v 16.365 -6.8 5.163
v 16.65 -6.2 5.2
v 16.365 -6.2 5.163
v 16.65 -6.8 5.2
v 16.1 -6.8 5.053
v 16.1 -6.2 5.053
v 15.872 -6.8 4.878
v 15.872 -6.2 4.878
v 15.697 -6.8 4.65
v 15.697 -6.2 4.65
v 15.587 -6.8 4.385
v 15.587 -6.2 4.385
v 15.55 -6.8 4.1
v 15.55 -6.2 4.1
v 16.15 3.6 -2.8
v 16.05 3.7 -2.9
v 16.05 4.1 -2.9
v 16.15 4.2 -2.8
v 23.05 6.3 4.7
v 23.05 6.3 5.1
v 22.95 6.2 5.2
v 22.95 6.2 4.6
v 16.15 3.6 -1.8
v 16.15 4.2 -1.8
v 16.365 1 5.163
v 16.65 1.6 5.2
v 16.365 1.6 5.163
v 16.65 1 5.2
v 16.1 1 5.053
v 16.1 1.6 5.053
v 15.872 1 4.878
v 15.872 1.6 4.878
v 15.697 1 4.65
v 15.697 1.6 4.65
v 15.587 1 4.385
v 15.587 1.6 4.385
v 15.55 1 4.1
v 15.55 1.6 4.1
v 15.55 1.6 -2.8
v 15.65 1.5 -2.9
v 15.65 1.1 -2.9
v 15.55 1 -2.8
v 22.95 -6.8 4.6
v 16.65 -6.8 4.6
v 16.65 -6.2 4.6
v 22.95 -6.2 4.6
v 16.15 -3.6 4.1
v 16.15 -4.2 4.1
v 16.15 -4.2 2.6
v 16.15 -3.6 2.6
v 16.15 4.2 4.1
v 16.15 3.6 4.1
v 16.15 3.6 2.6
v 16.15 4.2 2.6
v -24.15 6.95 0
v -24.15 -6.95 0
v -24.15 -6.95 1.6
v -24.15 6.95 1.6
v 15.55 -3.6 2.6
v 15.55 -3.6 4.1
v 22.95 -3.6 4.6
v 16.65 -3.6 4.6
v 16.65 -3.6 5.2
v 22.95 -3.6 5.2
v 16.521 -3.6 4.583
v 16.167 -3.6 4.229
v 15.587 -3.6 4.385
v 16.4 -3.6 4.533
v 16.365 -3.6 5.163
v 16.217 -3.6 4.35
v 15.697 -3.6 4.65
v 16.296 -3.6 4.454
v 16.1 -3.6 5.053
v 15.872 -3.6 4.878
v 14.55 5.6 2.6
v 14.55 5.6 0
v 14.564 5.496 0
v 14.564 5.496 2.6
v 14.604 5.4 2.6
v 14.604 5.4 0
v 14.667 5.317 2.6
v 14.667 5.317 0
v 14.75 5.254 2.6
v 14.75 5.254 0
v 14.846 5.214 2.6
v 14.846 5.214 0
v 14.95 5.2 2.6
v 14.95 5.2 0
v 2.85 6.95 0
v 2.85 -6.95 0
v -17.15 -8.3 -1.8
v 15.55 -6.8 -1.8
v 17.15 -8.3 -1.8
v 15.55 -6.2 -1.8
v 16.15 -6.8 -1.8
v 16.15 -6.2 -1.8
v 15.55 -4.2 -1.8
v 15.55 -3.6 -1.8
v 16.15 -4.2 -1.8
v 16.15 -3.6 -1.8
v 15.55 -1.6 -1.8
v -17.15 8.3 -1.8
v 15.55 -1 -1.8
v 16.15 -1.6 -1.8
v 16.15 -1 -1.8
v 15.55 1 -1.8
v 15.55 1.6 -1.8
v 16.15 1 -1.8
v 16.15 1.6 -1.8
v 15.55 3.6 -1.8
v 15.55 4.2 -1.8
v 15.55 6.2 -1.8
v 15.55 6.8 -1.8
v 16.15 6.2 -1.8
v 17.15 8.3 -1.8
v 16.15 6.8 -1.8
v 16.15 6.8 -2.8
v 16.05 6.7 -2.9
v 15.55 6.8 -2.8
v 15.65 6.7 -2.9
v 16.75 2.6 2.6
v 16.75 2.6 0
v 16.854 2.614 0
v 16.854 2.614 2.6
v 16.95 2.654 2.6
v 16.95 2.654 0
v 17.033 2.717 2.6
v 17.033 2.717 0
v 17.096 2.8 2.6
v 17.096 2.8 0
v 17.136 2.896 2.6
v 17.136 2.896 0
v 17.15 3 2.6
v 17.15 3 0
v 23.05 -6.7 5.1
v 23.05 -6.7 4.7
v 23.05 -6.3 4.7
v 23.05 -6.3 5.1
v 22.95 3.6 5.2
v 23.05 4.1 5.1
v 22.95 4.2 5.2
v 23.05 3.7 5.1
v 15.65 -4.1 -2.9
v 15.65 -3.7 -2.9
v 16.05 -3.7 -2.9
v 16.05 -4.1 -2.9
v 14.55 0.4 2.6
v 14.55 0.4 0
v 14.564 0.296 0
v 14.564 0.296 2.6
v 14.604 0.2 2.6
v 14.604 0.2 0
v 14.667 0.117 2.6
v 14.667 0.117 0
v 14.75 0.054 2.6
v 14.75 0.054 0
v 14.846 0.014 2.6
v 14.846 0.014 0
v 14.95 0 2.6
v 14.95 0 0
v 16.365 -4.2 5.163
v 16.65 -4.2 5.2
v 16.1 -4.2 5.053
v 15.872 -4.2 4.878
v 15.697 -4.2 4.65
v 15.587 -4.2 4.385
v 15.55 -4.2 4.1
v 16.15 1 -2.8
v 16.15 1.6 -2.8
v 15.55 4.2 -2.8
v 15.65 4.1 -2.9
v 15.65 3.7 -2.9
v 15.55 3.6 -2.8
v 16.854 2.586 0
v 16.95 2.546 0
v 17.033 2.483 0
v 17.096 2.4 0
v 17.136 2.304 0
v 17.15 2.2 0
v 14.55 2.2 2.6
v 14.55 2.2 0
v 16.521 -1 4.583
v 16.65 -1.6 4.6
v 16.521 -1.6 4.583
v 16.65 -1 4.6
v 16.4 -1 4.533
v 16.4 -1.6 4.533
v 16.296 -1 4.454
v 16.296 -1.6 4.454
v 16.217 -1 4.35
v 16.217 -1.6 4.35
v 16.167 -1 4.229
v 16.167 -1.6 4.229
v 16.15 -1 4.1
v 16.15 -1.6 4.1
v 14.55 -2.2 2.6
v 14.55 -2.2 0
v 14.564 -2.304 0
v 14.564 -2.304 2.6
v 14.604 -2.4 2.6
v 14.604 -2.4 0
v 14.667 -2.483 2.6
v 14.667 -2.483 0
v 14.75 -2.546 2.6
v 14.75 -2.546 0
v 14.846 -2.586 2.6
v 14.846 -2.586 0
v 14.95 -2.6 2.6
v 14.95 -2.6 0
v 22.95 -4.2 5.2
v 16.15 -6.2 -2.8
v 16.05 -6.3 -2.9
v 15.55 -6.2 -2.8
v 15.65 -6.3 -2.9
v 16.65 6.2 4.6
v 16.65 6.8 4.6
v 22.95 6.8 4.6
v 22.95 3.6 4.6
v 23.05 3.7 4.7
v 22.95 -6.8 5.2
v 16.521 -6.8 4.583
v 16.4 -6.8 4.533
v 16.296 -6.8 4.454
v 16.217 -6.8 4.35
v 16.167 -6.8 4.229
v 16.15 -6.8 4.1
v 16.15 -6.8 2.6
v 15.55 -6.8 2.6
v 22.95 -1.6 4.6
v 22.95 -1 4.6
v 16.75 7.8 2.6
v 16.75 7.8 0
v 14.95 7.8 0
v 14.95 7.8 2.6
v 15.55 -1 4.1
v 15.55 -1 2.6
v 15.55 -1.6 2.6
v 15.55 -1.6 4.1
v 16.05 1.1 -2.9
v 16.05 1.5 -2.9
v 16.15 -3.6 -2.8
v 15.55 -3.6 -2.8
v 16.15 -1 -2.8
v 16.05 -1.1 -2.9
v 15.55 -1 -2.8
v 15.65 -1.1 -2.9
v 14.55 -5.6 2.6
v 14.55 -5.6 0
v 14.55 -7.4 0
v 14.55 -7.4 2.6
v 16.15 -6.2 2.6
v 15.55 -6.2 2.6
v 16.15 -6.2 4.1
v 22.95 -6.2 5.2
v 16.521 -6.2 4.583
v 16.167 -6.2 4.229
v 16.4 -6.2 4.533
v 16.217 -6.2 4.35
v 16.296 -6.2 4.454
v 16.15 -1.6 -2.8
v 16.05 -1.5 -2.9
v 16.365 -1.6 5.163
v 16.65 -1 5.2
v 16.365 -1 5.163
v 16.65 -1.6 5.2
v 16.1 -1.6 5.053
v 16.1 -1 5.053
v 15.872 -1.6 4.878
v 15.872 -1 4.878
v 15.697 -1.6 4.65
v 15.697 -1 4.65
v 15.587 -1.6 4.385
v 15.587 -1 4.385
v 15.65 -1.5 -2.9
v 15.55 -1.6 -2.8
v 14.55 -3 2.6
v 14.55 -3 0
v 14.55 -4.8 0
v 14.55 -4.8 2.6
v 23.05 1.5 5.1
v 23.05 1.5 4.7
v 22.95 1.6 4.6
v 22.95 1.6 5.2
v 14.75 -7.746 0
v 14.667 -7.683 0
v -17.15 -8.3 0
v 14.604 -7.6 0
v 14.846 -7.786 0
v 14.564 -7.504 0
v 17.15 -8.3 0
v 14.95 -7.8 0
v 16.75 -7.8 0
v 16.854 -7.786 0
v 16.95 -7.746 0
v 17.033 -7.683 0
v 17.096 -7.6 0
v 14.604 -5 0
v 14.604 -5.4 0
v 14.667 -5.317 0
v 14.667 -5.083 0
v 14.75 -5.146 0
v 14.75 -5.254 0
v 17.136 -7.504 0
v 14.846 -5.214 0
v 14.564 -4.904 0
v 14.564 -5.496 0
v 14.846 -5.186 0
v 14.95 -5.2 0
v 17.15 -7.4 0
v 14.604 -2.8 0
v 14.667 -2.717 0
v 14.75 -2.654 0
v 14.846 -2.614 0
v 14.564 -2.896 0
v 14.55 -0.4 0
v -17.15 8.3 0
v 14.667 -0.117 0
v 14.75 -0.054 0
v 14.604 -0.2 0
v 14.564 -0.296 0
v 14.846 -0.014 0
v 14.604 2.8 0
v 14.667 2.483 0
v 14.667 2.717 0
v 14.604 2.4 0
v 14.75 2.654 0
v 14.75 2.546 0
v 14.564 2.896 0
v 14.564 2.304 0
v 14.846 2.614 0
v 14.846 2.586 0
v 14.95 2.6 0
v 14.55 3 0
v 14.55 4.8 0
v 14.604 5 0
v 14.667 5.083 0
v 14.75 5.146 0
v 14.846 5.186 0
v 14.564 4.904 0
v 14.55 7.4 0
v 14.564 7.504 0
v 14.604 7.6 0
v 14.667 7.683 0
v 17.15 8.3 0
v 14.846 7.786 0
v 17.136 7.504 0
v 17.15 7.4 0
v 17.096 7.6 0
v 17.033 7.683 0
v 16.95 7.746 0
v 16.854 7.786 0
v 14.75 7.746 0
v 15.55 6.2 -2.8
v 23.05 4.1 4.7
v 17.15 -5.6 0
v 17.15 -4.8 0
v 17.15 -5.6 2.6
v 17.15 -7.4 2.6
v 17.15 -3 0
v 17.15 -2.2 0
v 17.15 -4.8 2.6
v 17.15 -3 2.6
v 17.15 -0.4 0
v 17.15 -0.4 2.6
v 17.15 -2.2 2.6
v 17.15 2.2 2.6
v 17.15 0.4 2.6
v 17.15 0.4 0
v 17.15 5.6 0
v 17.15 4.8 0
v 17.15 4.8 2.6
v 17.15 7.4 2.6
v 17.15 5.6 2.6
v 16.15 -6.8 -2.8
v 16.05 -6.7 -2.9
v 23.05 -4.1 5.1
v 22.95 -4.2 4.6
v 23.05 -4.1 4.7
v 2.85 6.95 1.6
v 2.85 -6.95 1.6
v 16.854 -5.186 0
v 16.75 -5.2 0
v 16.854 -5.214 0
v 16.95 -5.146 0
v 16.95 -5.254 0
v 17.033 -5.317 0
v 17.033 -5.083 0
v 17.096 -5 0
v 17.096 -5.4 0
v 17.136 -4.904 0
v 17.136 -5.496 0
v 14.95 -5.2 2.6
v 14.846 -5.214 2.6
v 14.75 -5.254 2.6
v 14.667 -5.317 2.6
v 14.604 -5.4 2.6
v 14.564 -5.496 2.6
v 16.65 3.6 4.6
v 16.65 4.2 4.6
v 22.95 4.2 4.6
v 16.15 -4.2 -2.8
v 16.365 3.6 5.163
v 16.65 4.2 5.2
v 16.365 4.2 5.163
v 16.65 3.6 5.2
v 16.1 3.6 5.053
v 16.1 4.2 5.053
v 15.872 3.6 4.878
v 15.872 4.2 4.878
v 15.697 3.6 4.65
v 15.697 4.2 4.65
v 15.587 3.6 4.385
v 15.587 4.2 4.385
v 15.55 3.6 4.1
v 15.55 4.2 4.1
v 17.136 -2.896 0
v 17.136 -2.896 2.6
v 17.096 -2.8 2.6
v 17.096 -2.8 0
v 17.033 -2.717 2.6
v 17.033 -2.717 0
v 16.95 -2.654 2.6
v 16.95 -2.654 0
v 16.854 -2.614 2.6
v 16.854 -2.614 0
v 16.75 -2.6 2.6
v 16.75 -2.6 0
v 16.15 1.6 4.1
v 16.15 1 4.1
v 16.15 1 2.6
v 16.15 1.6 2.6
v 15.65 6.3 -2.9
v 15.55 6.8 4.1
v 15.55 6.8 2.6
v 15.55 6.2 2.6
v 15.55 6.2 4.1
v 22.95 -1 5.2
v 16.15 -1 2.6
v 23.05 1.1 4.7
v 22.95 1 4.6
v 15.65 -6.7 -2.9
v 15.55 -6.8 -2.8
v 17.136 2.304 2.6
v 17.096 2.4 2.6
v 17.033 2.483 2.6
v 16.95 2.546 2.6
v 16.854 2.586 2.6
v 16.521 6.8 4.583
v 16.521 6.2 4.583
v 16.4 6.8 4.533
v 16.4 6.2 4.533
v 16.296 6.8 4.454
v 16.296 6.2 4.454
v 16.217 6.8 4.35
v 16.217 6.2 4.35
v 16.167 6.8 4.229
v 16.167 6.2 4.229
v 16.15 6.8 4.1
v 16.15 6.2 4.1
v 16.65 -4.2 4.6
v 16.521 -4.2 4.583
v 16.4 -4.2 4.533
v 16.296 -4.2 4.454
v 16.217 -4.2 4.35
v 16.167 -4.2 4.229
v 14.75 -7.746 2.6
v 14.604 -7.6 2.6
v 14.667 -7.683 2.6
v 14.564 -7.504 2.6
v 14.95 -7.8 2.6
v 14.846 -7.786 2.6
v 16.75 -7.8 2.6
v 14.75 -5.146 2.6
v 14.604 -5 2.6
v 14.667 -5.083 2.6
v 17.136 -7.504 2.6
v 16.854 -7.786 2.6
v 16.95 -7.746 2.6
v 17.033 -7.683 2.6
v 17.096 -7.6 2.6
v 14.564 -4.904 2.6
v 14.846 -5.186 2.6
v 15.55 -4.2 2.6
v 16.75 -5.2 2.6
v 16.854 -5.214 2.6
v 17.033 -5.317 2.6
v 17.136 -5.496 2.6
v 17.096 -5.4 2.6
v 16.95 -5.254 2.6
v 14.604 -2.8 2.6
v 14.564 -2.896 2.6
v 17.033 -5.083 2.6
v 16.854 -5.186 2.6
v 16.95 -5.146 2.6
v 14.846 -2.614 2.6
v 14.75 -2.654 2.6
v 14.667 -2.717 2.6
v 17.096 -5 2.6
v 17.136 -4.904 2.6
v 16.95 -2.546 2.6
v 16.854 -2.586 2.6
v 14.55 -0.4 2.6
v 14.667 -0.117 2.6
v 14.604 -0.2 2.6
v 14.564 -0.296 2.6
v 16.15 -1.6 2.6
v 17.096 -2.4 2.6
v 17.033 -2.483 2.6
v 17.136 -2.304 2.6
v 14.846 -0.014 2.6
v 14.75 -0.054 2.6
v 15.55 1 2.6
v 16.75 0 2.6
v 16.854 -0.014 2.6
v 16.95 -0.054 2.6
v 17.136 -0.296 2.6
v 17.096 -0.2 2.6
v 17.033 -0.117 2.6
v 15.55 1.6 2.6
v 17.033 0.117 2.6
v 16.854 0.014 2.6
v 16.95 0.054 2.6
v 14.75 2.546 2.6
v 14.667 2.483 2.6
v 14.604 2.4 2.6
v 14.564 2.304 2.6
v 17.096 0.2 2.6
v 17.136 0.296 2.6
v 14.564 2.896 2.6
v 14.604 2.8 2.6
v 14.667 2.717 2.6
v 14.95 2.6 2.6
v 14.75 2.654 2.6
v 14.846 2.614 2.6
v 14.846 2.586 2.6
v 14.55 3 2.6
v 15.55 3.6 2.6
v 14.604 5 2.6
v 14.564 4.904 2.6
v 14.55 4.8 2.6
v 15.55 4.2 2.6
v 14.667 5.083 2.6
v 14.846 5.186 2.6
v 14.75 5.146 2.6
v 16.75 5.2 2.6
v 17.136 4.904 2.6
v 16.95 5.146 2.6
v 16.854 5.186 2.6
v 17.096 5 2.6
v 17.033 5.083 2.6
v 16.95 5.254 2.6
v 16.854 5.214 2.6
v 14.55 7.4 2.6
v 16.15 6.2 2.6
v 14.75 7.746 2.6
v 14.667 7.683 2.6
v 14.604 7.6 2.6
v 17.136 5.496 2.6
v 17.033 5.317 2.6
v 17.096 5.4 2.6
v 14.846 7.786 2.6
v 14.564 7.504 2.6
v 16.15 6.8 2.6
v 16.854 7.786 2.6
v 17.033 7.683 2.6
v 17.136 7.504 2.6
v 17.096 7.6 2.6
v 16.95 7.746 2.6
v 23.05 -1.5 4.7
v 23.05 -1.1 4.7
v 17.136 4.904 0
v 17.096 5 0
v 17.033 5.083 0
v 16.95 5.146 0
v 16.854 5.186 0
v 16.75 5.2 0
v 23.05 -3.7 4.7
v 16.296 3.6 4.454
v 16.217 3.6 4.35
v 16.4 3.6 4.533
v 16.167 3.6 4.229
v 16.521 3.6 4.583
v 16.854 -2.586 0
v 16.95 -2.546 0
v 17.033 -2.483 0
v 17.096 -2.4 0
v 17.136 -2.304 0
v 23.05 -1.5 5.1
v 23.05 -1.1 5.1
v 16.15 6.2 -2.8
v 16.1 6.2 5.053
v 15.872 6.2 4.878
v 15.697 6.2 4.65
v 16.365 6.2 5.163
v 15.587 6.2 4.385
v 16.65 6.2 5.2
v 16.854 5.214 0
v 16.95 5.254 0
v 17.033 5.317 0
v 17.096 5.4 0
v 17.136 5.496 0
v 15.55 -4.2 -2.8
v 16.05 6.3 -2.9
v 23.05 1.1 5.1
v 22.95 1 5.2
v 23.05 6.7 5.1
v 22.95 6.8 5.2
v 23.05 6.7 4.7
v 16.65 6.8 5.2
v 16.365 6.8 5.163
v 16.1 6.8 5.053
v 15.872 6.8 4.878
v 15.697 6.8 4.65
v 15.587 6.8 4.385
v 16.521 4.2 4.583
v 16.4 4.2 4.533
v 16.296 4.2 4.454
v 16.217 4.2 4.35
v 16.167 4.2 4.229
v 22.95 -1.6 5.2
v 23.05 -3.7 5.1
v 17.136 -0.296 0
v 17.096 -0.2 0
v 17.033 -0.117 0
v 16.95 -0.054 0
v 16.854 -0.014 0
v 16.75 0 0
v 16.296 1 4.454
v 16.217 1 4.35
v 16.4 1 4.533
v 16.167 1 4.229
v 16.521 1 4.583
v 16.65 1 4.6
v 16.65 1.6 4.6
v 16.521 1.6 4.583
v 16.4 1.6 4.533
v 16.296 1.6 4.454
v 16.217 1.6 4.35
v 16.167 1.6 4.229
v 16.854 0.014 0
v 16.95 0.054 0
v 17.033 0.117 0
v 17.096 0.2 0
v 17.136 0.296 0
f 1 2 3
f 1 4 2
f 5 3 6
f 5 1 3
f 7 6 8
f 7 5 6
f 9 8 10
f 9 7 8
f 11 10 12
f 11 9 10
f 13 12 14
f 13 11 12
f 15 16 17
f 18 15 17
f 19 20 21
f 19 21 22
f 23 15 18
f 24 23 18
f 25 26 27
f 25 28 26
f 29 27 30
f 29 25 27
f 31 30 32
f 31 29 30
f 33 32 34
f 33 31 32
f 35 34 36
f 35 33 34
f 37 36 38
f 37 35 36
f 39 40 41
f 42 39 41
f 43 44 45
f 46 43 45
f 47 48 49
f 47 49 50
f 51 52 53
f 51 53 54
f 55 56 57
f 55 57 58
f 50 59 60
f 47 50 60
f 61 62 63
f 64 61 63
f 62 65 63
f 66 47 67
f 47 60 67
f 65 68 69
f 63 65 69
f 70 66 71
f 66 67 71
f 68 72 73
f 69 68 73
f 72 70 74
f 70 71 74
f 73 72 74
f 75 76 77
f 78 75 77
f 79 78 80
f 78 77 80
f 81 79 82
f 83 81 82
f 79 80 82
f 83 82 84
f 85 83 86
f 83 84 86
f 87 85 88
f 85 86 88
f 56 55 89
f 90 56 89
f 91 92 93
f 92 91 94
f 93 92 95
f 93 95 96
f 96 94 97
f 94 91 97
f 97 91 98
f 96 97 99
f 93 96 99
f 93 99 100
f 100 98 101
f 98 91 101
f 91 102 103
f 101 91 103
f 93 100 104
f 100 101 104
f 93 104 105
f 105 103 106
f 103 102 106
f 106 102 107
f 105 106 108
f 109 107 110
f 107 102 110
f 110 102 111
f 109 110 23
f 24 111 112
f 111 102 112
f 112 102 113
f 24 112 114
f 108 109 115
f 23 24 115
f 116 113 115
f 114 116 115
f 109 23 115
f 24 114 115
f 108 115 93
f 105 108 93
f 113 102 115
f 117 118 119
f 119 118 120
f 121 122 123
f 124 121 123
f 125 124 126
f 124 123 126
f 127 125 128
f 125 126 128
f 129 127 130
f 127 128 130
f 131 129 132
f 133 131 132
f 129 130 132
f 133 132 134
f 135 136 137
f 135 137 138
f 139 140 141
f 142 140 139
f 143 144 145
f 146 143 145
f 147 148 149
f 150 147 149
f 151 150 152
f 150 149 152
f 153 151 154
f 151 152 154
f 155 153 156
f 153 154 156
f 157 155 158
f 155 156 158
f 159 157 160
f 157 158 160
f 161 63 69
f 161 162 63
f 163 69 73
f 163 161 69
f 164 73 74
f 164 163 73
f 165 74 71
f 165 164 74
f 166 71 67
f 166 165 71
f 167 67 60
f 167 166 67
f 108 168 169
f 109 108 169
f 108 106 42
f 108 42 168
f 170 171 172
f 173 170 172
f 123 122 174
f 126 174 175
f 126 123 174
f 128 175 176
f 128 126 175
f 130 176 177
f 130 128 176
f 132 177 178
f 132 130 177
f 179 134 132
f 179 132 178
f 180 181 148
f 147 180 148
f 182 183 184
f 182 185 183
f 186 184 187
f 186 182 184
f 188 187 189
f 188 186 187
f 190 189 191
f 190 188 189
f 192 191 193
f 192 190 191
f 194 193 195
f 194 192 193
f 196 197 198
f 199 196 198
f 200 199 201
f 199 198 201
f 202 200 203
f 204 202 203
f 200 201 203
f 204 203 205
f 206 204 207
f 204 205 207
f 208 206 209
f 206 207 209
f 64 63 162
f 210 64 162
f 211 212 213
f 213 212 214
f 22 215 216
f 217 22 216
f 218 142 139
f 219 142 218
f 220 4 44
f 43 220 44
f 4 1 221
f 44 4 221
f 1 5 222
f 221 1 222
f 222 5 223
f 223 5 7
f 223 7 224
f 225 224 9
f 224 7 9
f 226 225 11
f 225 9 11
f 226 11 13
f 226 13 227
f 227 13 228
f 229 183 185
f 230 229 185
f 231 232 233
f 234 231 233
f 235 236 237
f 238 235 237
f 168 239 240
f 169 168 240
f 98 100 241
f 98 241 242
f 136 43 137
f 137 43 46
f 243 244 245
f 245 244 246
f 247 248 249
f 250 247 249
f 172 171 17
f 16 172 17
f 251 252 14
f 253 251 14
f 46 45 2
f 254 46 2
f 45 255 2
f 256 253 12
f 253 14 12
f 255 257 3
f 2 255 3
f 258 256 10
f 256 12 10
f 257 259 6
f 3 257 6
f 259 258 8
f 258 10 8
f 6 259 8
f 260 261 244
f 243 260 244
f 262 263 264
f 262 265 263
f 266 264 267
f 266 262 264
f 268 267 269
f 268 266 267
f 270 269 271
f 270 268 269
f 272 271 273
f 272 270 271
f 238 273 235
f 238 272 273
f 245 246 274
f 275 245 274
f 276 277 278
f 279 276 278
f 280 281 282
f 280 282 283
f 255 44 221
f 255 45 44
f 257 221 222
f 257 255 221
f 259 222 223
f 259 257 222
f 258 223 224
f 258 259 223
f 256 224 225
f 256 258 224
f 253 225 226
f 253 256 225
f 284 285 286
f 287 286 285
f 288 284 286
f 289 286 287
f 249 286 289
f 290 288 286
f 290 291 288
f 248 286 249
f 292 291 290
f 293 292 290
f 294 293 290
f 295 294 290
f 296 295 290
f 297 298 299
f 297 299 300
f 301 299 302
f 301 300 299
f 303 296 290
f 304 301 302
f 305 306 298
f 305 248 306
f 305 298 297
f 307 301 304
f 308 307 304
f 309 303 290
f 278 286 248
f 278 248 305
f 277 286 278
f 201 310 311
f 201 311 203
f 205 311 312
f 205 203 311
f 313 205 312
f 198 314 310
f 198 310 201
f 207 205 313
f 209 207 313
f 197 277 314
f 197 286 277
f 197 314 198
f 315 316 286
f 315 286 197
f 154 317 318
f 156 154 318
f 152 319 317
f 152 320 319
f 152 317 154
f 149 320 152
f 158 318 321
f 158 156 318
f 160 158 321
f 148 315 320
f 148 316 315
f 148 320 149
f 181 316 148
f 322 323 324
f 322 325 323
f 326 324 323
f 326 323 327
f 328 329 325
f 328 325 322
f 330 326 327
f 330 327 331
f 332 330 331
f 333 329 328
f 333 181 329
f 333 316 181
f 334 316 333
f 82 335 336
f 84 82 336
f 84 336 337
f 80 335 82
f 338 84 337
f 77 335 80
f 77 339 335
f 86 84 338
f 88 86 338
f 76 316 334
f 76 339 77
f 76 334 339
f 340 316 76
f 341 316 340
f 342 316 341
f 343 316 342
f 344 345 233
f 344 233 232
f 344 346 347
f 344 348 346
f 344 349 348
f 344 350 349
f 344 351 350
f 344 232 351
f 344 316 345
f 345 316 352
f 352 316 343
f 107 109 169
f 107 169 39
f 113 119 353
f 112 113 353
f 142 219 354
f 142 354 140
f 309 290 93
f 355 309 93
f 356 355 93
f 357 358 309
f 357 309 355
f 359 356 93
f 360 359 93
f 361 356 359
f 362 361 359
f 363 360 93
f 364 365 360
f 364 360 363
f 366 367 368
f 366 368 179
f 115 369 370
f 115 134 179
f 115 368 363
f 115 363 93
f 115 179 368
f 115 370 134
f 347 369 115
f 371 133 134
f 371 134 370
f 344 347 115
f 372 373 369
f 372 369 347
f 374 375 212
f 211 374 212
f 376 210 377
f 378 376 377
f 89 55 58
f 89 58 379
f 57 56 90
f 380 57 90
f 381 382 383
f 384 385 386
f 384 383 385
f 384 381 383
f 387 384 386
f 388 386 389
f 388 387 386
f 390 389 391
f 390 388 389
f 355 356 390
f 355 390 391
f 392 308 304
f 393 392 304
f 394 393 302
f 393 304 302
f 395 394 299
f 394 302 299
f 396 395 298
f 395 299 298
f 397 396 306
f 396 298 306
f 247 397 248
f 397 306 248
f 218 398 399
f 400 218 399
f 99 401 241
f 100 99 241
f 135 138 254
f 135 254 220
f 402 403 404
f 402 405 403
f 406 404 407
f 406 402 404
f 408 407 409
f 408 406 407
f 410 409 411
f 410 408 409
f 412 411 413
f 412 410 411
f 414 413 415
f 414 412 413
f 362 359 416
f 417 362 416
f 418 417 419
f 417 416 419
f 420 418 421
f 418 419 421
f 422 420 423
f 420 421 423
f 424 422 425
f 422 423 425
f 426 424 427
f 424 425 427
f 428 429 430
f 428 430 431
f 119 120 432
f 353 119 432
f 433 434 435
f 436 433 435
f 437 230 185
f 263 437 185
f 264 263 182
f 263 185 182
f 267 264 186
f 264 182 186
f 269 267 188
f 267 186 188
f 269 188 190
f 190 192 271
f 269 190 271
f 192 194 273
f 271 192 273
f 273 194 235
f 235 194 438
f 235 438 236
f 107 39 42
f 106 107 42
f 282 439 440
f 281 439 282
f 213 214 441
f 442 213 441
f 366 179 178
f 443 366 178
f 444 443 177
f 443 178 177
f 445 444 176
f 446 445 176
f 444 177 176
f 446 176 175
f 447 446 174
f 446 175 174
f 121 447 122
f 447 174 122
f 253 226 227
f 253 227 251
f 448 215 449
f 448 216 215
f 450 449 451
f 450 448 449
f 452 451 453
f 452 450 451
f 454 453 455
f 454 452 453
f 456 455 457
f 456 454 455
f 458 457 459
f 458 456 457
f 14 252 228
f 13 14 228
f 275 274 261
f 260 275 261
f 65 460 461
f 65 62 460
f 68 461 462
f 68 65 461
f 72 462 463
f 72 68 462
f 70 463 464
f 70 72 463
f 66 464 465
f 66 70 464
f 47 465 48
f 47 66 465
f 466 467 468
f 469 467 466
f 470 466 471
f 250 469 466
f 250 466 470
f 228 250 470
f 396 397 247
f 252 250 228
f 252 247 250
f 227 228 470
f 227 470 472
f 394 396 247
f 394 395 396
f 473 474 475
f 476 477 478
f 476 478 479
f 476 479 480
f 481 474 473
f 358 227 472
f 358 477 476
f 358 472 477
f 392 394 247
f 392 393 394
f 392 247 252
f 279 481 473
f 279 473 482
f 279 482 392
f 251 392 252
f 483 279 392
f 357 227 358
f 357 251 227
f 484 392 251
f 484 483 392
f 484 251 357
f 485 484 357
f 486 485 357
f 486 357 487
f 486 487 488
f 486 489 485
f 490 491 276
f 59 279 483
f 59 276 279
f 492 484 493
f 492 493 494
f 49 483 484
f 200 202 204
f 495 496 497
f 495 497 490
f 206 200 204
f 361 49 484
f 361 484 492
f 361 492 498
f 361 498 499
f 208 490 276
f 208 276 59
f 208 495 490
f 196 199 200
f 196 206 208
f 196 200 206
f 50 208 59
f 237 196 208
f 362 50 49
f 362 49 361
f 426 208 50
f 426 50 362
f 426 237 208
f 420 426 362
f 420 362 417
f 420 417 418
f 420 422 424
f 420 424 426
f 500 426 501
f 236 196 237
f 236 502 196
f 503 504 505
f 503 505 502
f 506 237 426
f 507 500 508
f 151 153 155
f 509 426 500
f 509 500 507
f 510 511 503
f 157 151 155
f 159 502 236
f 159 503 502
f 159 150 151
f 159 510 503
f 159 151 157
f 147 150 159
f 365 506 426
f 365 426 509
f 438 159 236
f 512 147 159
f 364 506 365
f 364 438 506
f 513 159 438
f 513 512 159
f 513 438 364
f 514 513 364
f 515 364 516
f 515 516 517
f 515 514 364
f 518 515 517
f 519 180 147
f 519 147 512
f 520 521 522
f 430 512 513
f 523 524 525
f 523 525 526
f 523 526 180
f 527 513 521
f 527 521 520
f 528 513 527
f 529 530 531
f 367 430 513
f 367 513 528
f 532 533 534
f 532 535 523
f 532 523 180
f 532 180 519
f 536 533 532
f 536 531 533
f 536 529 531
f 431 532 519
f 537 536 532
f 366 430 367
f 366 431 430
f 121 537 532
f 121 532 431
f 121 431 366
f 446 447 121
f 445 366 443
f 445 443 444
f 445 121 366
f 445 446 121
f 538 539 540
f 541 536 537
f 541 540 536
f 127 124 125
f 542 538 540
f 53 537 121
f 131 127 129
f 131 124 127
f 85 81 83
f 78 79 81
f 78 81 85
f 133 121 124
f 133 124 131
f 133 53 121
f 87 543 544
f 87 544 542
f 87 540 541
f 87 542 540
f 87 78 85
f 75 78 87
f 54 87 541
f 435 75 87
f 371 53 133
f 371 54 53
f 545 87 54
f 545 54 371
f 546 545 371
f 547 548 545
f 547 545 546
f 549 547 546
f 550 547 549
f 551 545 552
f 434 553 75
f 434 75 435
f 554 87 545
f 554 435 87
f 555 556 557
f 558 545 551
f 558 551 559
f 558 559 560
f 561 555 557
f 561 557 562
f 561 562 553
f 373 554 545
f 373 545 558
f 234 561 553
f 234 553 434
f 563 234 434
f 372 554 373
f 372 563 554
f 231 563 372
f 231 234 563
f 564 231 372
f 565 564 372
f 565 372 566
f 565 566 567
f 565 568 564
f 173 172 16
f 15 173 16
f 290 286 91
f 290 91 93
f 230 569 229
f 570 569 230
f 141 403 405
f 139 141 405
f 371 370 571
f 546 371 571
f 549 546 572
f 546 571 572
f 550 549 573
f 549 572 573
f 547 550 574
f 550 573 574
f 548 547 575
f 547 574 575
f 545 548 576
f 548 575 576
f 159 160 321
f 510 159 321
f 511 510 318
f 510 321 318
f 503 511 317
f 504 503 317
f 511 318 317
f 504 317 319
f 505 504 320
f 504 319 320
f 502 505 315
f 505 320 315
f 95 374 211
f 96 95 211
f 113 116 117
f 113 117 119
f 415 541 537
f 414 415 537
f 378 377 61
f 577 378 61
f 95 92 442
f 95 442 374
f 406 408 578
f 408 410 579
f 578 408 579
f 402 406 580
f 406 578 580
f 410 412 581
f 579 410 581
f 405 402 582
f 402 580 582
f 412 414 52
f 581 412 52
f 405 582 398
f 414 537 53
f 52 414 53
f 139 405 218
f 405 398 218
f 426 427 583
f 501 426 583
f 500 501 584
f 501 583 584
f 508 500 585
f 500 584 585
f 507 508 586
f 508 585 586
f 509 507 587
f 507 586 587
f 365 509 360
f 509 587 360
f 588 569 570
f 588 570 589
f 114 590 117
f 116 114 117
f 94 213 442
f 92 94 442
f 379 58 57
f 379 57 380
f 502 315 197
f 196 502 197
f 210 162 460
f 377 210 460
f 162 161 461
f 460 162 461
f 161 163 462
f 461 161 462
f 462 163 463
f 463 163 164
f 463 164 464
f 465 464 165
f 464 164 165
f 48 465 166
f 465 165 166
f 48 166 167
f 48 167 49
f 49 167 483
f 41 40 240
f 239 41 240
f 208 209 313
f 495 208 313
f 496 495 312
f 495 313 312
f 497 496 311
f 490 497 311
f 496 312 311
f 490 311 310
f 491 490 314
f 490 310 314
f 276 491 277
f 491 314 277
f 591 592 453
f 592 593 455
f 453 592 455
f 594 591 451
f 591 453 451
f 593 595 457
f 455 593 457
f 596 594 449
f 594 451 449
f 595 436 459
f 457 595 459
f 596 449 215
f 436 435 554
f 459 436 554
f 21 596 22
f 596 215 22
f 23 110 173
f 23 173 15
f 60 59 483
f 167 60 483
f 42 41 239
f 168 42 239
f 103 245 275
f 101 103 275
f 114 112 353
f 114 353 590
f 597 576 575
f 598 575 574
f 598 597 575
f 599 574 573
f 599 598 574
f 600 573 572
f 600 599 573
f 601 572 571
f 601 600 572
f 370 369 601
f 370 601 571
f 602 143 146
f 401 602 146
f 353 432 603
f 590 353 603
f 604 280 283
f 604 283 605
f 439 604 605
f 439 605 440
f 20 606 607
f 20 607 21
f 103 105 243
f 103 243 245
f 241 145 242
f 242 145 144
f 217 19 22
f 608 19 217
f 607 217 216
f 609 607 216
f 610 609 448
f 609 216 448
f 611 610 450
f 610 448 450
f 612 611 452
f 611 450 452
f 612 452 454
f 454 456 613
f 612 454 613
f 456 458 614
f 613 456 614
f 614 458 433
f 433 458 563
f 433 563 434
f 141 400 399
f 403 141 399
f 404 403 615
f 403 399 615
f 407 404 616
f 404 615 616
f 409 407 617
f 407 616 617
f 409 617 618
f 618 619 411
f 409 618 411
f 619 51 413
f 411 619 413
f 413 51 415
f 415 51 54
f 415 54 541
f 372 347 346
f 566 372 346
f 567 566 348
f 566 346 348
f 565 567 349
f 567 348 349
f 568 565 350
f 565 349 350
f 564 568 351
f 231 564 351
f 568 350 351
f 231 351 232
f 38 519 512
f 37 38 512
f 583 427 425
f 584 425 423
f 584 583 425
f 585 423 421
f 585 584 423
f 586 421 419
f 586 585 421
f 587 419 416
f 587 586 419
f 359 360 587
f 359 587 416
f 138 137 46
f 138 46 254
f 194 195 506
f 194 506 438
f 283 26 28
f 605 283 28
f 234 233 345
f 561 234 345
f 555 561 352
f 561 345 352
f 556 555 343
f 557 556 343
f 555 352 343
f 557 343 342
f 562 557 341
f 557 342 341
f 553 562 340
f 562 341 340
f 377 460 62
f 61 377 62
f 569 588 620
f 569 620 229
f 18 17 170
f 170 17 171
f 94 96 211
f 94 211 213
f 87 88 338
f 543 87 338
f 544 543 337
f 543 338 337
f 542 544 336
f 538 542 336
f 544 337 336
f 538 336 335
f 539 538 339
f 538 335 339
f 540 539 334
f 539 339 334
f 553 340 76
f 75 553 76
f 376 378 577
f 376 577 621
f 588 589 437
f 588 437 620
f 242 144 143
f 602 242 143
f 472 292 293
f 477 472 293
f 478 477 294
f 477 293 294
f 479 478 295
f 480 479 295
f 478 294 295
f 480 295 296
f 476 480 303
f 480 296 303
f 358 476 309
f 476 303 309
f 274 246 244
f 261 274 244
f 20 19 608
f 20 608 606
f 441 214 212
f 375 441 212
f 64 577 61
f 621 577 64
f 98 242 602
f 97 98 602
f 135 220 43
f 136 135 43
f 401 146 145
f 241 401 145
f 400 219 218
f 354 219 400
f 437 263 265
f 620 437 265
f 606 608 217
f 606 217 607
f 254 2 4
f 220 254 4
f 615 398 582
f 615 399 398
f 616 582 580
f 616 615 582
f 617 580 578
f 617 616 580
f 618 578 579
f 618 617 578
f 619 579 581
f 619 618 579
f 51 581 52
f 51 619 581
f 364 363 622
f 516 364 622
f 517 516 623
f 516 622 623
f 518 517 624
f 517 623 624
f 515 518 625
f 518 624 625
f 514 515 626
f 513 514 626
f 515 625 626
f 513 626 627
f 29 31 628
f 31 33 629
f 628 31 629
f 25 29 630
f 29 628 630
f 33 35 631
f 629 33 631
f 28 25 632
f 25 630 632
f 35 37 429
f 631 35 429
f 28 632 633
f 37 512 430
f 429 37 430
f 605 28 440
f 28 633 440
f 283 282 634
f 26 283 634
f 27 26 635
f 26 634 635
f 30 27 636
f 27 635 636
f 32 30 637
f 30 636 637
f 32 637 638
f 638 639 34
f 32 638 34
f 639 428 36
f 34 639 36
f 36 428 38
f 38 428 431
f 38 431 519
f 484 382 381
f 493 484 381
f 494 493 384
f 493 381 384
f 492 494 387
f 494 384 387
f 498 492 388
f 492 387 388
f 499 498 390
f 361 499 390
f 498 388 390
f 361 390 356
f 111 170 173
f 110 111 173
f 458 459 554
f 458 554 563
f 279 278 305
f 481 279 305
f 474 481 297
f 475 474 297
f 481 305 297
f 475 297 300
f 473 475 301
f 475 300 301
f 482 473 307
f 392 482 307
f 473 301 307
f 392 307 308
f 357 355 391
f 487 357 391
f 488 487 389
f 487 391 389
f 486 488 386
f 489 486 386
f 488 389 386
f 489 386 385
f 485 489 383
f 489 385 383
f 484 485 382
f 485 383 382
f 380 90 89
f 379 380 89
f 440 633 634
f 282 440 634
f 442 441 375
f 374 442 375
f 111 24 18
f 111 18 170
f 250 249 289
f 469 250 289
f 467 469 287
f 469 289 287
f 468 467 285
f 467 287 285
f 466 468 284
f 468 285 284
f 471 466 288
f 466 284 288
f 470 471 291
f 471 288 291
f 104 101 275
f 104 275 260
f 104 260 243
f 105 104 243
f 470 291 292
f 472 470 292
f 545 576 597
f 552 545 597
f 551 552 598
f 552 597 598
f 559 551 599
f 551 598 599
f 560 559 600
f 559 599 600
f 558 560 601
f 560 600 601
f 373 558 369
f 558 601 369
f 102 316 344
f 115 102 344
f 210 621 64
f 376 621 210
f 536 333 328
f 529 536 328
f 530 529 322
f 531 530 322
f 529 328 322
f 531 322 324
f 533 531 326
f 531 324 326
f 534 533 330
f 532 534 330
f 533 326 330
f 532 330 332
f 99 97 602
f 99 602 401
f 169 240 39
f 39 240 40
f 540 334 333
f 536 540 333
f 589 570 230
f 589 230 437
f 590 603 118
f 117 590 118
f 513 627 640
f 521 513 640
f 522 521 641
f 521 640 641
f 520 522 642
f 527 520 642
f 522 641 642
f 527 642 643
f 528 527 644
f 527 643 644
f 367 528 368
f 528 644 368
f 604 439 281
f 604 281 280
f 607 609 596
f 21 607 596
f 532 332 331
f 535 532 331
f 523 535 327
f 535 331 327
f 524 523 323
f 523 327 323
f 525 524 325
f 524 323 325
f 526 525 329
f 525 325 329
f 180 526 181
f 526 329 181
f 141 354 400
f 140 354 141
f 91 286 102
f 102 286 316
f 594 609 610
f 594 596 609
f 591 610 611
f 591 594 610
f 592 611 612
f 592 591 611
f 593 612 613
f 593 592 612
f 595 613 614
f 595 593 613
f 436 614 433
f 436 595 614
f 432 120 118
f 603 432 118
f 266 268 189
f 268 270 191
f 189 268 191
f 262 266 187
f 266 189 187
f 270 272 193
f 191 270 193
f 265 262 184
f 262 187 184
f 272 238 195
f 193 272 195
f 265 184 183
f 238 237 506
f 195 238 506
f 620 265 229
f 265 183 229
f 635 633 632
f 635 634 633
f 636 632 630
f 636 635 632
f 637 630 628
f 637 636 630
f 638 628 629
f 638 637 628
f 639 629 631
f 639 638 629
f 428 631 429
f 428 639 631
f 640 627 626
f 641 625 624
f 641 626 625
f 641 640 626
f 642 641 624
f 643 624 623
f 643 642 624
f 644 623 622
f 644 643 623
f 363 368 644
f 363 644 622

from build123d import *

# Parameters (mm, degrees)
SKETCH1_W                  = 34.3
SKETCH1_H                  = 16.6
BOSS_EXTRUDE1_DEPTH        = 1.8
SKETCH2_W                  = 27
SKETCH2_H                  = 13.9
BOSS_EXTRUDE2_DEPTH        = 1.6
BOSS_EXTRUDE3_DEPTH        = 2.6
LPATTERN1_COUNT            = 2
LPATTERN1_PITCH            = 7.8
SKETCH6_W                  = 0.6
SKETCH6_H                  = 0.6
CHAMFER1_SIZE              = 0.1
LPATTERN2_COUNT            = 6
LPATTERN2_PITCH            = 2.6
CHAMFER1_OF_LPATTERN2_SIZE = 0.1


with BuildPart() as part:
    # Sketch1 → Boss-Extrude1 (new body)
    with BuildSketch(Plane.XY):
        Rectangle(SKETCH1_W, SKETCH1_H)
    extrude(amount=-BOSS_EXTRUDE1_DEPTH)



with BuildPart() as body_2:
    # Sketch2 → Boss-Extrude2 (new body)
    with BuildSketch(Plane.XY):
        with Locations((-10.65, 0)):
            Rectangle(SKETCH2_W, SKETCH2_H)
    extrude(amount=BOSS_EXTRUDE2_DEPTH)


with BuildPart() as body_3:
    # Sketch3 → Boss-Extrude3 (new body)
    with BuildSketch(Plane.XY):
        with BuildLine():
            ThreePointArc((14.55, -2.2), (14.667157288, -2.482842712), (14.95, -2.6))
            Line((14.95, -2.6), (16.75, -2.6))
            ThreePointArc((16.75, -2.6), (17.032842712, -2.482842712), (17.15, -2.2))
            Line((17.15, -2.2), (17.15, -0.4))
            ThreePointArc((17.15, -0.4), (17.032842712, -0.117157288), (16.75, 0))
            Line((16.75, 0), (14.95, 0))
            ThreePointArc((14.95, 0), (14.667157288, -0.117157288), (14.55, -0.4))
            Line((14.55, -0.4), (14.55, -2.2))
        make_face()
        with BuildLine():
            Line((16.75, -2.6), (14.95, -2.6))
            ThreePointArc((14.95, -2.6), (14.667157288, -2.717157288), (14.55, -3))
            Line((14.55, -3), (14.55, -4.8))
            ThreePointArc((14.55, -4.8), (14.667157288, -5.082842712), (14.95, -5.2))
            Line((14.95, -5.2), (16.75, -5.2))
            ThreePointArc((16.75, -5.2), (17.032842712, -5.082842712), (17.15, -4.8))
            Line((17.15, -4.8), (17.15, -3))
            ThreePointArc((17.15, -3), (17.032842712, -2.717157288), (16.75, -2.6))
        make_face()
        with BuildLine():
            Line((16.75, -5.2), (14.95, -5.2))
            ThreePointArc((14.95, -5.2), (14.667157288, -5.317157288), (14.55, -5.6))
            Line((14.55, -5.6), (14.55, -7.4))
            ThreePointArc((14.55, -7.4), (14.667157288, -7.682842712), (14.95, -7.8))
            Line((14.95, -7.8), (16.75, -7.8))
            ThreePointArc((16.75, -7.8), (17.032842712, -7.682842712), (17.15, -7.4))
            Line((17.15, -7.4), (17.15, -5.6))
            ThreePointArc((17.15, -5.6), (17.032842712, -5.317157288), (16.75, -5.2))
        make_face()
    boss_extrude3 = extrude(amount=BOSS_EXTRUDE3_DEPTH)


with BuildPart() as lpattern1_1:
    # LPattern1: Boss-Extrude3 ×2
    with Locations(*[(0, i * LPATTERN1_PITCH, 0) for i in range(1, LPATTERN1_COUNT)]):
        add(boss_extrude3)


with BuildPart() as part_1:
    add(part.part)

    add(body_3.part)  # Sweep2 merges body 3
    # Sweep2: sweep along a path in Sketch5
    with BuildLine(Plane(origin=(0, -6.5, 0), x_dir=(-1, 0, 0), z_dir=(0, -1, 0))) as sweep2_path:
        Line((-23.05, -4.9), (-16.65, -4.9))
        ThreePointArc((-16.65, -4.9), (-16.084314575, -4.665685425), (-15.85, -4.1))
        Line((-15.85, -4.1), (-15.85, -2.6))
        Line((-15.85, -2.6), (-15.85, 2.9))
    # Sketch6 → Sweep2 (sweep)
    with BuildSketch(Plane(origin=(23.05, 0, 0), x_dir=(0, 0, -1), z_dir=(1, 0, 0))):
        with Locations((-4.9, -6.5)):
            Rectangle(SKETCH6_W, SKETCH6_H)
    sweep2 = sweep(path=sweep2_path.line)

    # Chamfer1
    chamfer1_edges = [part_1.edges().sort_by_distance(p)[0] for p in [
        (23.05, -6.5, 5.2),
        (23.05, -6.8, 4.9),
        (23.05, -6.5, 4.6),
        (23.05, -6.2, 4.9),
        (16.15, -6.5, -2.9),
        (15.85, -6.2, -2.9),
        (15.55, -6.5, -2.9),
        (15.85, -6.8, -2.9),
    ]]
    chamfer(chamfer1_edges, length=CHAMFER1_SIZE)


    add(lpattern1_1.part)  # LPattern2 merges LPattern1_1
    # LPattern2: Sweep2 ×6
    with Locations(*[(0, i * LPATTERN2_PITCH, 0) for i in range(1, LPATTERN2_COUNT)]):
        add(sweep2)

    # Chamfer1 of LPattern2
    chamfer1_of_lpattern2_edges = [part_1.edges().sort_by_distance(p)[0] for p in [
        (23.05, -3.9, 5.2),
        (23.05, -4.2, 4.9),
        (23.05, -3.9, 4.6),
        (23.05, -3.6, 4.9),
        (16.15, -3.9, -2.9),
        (15.85, -3.6, -2.9),
        (15.55, -3.9, -2.9),
        (15.85, -4.2, -2.9),
        (23.05, -1.3, 5.2),
        (23.05, -1.6, 4.9),
        (23.05, -1.3, 4.6),
        (23.05, -1, 4.9),
        (16.15, -1.3, -2.9),
        (15.85, -1, -2.9),
        (15.55, -1.3, -2.9),
        (15.85, -1.6, -2.9),
        (23.05, 1.3, 5.2),
        (23.05, 1, 4.9),
        (23.05, 1.3, 4.6),
        (23.05, 1.6, 4.9),
        (16.15, 1.3, -2.9),
        (15.85, 1.6, -2.9),
        (15.55, 1.3, -2.9),
        (15.85, 1, -2.9),
        (23.05, 3.9, 5.2),
        (23.05, 3.6, 4.9),
        (23.05, 3.9, 4.6),
        (23.05, 4.2, 4.9),
        (16.15, 3.9, -2.9),
        (15.85, 4.2, -2.9),
        (15.55, 3.9, -2.9),
        (15.85, 3.6, -2.9),
        (23.05, 6.5, 5.2),
        (23.05, 6.2, 4.9),
        (23.05, 6.5, 4.6),
        (23.05, 6.8, 4.9),
        (16.15, 6.5, -2.9),
        (15.85, 6.8, -2.9),
        (15.55, 6.5, -2.9),
        (15.85, 6.2, -2.9),
    ]]
    chamfer(chamfer1_of_lpattern2_edges, length=CHAMFER1_OF_LPATTERN2_SIZE)


solid = Compound([body_2.part, part_1.part])
